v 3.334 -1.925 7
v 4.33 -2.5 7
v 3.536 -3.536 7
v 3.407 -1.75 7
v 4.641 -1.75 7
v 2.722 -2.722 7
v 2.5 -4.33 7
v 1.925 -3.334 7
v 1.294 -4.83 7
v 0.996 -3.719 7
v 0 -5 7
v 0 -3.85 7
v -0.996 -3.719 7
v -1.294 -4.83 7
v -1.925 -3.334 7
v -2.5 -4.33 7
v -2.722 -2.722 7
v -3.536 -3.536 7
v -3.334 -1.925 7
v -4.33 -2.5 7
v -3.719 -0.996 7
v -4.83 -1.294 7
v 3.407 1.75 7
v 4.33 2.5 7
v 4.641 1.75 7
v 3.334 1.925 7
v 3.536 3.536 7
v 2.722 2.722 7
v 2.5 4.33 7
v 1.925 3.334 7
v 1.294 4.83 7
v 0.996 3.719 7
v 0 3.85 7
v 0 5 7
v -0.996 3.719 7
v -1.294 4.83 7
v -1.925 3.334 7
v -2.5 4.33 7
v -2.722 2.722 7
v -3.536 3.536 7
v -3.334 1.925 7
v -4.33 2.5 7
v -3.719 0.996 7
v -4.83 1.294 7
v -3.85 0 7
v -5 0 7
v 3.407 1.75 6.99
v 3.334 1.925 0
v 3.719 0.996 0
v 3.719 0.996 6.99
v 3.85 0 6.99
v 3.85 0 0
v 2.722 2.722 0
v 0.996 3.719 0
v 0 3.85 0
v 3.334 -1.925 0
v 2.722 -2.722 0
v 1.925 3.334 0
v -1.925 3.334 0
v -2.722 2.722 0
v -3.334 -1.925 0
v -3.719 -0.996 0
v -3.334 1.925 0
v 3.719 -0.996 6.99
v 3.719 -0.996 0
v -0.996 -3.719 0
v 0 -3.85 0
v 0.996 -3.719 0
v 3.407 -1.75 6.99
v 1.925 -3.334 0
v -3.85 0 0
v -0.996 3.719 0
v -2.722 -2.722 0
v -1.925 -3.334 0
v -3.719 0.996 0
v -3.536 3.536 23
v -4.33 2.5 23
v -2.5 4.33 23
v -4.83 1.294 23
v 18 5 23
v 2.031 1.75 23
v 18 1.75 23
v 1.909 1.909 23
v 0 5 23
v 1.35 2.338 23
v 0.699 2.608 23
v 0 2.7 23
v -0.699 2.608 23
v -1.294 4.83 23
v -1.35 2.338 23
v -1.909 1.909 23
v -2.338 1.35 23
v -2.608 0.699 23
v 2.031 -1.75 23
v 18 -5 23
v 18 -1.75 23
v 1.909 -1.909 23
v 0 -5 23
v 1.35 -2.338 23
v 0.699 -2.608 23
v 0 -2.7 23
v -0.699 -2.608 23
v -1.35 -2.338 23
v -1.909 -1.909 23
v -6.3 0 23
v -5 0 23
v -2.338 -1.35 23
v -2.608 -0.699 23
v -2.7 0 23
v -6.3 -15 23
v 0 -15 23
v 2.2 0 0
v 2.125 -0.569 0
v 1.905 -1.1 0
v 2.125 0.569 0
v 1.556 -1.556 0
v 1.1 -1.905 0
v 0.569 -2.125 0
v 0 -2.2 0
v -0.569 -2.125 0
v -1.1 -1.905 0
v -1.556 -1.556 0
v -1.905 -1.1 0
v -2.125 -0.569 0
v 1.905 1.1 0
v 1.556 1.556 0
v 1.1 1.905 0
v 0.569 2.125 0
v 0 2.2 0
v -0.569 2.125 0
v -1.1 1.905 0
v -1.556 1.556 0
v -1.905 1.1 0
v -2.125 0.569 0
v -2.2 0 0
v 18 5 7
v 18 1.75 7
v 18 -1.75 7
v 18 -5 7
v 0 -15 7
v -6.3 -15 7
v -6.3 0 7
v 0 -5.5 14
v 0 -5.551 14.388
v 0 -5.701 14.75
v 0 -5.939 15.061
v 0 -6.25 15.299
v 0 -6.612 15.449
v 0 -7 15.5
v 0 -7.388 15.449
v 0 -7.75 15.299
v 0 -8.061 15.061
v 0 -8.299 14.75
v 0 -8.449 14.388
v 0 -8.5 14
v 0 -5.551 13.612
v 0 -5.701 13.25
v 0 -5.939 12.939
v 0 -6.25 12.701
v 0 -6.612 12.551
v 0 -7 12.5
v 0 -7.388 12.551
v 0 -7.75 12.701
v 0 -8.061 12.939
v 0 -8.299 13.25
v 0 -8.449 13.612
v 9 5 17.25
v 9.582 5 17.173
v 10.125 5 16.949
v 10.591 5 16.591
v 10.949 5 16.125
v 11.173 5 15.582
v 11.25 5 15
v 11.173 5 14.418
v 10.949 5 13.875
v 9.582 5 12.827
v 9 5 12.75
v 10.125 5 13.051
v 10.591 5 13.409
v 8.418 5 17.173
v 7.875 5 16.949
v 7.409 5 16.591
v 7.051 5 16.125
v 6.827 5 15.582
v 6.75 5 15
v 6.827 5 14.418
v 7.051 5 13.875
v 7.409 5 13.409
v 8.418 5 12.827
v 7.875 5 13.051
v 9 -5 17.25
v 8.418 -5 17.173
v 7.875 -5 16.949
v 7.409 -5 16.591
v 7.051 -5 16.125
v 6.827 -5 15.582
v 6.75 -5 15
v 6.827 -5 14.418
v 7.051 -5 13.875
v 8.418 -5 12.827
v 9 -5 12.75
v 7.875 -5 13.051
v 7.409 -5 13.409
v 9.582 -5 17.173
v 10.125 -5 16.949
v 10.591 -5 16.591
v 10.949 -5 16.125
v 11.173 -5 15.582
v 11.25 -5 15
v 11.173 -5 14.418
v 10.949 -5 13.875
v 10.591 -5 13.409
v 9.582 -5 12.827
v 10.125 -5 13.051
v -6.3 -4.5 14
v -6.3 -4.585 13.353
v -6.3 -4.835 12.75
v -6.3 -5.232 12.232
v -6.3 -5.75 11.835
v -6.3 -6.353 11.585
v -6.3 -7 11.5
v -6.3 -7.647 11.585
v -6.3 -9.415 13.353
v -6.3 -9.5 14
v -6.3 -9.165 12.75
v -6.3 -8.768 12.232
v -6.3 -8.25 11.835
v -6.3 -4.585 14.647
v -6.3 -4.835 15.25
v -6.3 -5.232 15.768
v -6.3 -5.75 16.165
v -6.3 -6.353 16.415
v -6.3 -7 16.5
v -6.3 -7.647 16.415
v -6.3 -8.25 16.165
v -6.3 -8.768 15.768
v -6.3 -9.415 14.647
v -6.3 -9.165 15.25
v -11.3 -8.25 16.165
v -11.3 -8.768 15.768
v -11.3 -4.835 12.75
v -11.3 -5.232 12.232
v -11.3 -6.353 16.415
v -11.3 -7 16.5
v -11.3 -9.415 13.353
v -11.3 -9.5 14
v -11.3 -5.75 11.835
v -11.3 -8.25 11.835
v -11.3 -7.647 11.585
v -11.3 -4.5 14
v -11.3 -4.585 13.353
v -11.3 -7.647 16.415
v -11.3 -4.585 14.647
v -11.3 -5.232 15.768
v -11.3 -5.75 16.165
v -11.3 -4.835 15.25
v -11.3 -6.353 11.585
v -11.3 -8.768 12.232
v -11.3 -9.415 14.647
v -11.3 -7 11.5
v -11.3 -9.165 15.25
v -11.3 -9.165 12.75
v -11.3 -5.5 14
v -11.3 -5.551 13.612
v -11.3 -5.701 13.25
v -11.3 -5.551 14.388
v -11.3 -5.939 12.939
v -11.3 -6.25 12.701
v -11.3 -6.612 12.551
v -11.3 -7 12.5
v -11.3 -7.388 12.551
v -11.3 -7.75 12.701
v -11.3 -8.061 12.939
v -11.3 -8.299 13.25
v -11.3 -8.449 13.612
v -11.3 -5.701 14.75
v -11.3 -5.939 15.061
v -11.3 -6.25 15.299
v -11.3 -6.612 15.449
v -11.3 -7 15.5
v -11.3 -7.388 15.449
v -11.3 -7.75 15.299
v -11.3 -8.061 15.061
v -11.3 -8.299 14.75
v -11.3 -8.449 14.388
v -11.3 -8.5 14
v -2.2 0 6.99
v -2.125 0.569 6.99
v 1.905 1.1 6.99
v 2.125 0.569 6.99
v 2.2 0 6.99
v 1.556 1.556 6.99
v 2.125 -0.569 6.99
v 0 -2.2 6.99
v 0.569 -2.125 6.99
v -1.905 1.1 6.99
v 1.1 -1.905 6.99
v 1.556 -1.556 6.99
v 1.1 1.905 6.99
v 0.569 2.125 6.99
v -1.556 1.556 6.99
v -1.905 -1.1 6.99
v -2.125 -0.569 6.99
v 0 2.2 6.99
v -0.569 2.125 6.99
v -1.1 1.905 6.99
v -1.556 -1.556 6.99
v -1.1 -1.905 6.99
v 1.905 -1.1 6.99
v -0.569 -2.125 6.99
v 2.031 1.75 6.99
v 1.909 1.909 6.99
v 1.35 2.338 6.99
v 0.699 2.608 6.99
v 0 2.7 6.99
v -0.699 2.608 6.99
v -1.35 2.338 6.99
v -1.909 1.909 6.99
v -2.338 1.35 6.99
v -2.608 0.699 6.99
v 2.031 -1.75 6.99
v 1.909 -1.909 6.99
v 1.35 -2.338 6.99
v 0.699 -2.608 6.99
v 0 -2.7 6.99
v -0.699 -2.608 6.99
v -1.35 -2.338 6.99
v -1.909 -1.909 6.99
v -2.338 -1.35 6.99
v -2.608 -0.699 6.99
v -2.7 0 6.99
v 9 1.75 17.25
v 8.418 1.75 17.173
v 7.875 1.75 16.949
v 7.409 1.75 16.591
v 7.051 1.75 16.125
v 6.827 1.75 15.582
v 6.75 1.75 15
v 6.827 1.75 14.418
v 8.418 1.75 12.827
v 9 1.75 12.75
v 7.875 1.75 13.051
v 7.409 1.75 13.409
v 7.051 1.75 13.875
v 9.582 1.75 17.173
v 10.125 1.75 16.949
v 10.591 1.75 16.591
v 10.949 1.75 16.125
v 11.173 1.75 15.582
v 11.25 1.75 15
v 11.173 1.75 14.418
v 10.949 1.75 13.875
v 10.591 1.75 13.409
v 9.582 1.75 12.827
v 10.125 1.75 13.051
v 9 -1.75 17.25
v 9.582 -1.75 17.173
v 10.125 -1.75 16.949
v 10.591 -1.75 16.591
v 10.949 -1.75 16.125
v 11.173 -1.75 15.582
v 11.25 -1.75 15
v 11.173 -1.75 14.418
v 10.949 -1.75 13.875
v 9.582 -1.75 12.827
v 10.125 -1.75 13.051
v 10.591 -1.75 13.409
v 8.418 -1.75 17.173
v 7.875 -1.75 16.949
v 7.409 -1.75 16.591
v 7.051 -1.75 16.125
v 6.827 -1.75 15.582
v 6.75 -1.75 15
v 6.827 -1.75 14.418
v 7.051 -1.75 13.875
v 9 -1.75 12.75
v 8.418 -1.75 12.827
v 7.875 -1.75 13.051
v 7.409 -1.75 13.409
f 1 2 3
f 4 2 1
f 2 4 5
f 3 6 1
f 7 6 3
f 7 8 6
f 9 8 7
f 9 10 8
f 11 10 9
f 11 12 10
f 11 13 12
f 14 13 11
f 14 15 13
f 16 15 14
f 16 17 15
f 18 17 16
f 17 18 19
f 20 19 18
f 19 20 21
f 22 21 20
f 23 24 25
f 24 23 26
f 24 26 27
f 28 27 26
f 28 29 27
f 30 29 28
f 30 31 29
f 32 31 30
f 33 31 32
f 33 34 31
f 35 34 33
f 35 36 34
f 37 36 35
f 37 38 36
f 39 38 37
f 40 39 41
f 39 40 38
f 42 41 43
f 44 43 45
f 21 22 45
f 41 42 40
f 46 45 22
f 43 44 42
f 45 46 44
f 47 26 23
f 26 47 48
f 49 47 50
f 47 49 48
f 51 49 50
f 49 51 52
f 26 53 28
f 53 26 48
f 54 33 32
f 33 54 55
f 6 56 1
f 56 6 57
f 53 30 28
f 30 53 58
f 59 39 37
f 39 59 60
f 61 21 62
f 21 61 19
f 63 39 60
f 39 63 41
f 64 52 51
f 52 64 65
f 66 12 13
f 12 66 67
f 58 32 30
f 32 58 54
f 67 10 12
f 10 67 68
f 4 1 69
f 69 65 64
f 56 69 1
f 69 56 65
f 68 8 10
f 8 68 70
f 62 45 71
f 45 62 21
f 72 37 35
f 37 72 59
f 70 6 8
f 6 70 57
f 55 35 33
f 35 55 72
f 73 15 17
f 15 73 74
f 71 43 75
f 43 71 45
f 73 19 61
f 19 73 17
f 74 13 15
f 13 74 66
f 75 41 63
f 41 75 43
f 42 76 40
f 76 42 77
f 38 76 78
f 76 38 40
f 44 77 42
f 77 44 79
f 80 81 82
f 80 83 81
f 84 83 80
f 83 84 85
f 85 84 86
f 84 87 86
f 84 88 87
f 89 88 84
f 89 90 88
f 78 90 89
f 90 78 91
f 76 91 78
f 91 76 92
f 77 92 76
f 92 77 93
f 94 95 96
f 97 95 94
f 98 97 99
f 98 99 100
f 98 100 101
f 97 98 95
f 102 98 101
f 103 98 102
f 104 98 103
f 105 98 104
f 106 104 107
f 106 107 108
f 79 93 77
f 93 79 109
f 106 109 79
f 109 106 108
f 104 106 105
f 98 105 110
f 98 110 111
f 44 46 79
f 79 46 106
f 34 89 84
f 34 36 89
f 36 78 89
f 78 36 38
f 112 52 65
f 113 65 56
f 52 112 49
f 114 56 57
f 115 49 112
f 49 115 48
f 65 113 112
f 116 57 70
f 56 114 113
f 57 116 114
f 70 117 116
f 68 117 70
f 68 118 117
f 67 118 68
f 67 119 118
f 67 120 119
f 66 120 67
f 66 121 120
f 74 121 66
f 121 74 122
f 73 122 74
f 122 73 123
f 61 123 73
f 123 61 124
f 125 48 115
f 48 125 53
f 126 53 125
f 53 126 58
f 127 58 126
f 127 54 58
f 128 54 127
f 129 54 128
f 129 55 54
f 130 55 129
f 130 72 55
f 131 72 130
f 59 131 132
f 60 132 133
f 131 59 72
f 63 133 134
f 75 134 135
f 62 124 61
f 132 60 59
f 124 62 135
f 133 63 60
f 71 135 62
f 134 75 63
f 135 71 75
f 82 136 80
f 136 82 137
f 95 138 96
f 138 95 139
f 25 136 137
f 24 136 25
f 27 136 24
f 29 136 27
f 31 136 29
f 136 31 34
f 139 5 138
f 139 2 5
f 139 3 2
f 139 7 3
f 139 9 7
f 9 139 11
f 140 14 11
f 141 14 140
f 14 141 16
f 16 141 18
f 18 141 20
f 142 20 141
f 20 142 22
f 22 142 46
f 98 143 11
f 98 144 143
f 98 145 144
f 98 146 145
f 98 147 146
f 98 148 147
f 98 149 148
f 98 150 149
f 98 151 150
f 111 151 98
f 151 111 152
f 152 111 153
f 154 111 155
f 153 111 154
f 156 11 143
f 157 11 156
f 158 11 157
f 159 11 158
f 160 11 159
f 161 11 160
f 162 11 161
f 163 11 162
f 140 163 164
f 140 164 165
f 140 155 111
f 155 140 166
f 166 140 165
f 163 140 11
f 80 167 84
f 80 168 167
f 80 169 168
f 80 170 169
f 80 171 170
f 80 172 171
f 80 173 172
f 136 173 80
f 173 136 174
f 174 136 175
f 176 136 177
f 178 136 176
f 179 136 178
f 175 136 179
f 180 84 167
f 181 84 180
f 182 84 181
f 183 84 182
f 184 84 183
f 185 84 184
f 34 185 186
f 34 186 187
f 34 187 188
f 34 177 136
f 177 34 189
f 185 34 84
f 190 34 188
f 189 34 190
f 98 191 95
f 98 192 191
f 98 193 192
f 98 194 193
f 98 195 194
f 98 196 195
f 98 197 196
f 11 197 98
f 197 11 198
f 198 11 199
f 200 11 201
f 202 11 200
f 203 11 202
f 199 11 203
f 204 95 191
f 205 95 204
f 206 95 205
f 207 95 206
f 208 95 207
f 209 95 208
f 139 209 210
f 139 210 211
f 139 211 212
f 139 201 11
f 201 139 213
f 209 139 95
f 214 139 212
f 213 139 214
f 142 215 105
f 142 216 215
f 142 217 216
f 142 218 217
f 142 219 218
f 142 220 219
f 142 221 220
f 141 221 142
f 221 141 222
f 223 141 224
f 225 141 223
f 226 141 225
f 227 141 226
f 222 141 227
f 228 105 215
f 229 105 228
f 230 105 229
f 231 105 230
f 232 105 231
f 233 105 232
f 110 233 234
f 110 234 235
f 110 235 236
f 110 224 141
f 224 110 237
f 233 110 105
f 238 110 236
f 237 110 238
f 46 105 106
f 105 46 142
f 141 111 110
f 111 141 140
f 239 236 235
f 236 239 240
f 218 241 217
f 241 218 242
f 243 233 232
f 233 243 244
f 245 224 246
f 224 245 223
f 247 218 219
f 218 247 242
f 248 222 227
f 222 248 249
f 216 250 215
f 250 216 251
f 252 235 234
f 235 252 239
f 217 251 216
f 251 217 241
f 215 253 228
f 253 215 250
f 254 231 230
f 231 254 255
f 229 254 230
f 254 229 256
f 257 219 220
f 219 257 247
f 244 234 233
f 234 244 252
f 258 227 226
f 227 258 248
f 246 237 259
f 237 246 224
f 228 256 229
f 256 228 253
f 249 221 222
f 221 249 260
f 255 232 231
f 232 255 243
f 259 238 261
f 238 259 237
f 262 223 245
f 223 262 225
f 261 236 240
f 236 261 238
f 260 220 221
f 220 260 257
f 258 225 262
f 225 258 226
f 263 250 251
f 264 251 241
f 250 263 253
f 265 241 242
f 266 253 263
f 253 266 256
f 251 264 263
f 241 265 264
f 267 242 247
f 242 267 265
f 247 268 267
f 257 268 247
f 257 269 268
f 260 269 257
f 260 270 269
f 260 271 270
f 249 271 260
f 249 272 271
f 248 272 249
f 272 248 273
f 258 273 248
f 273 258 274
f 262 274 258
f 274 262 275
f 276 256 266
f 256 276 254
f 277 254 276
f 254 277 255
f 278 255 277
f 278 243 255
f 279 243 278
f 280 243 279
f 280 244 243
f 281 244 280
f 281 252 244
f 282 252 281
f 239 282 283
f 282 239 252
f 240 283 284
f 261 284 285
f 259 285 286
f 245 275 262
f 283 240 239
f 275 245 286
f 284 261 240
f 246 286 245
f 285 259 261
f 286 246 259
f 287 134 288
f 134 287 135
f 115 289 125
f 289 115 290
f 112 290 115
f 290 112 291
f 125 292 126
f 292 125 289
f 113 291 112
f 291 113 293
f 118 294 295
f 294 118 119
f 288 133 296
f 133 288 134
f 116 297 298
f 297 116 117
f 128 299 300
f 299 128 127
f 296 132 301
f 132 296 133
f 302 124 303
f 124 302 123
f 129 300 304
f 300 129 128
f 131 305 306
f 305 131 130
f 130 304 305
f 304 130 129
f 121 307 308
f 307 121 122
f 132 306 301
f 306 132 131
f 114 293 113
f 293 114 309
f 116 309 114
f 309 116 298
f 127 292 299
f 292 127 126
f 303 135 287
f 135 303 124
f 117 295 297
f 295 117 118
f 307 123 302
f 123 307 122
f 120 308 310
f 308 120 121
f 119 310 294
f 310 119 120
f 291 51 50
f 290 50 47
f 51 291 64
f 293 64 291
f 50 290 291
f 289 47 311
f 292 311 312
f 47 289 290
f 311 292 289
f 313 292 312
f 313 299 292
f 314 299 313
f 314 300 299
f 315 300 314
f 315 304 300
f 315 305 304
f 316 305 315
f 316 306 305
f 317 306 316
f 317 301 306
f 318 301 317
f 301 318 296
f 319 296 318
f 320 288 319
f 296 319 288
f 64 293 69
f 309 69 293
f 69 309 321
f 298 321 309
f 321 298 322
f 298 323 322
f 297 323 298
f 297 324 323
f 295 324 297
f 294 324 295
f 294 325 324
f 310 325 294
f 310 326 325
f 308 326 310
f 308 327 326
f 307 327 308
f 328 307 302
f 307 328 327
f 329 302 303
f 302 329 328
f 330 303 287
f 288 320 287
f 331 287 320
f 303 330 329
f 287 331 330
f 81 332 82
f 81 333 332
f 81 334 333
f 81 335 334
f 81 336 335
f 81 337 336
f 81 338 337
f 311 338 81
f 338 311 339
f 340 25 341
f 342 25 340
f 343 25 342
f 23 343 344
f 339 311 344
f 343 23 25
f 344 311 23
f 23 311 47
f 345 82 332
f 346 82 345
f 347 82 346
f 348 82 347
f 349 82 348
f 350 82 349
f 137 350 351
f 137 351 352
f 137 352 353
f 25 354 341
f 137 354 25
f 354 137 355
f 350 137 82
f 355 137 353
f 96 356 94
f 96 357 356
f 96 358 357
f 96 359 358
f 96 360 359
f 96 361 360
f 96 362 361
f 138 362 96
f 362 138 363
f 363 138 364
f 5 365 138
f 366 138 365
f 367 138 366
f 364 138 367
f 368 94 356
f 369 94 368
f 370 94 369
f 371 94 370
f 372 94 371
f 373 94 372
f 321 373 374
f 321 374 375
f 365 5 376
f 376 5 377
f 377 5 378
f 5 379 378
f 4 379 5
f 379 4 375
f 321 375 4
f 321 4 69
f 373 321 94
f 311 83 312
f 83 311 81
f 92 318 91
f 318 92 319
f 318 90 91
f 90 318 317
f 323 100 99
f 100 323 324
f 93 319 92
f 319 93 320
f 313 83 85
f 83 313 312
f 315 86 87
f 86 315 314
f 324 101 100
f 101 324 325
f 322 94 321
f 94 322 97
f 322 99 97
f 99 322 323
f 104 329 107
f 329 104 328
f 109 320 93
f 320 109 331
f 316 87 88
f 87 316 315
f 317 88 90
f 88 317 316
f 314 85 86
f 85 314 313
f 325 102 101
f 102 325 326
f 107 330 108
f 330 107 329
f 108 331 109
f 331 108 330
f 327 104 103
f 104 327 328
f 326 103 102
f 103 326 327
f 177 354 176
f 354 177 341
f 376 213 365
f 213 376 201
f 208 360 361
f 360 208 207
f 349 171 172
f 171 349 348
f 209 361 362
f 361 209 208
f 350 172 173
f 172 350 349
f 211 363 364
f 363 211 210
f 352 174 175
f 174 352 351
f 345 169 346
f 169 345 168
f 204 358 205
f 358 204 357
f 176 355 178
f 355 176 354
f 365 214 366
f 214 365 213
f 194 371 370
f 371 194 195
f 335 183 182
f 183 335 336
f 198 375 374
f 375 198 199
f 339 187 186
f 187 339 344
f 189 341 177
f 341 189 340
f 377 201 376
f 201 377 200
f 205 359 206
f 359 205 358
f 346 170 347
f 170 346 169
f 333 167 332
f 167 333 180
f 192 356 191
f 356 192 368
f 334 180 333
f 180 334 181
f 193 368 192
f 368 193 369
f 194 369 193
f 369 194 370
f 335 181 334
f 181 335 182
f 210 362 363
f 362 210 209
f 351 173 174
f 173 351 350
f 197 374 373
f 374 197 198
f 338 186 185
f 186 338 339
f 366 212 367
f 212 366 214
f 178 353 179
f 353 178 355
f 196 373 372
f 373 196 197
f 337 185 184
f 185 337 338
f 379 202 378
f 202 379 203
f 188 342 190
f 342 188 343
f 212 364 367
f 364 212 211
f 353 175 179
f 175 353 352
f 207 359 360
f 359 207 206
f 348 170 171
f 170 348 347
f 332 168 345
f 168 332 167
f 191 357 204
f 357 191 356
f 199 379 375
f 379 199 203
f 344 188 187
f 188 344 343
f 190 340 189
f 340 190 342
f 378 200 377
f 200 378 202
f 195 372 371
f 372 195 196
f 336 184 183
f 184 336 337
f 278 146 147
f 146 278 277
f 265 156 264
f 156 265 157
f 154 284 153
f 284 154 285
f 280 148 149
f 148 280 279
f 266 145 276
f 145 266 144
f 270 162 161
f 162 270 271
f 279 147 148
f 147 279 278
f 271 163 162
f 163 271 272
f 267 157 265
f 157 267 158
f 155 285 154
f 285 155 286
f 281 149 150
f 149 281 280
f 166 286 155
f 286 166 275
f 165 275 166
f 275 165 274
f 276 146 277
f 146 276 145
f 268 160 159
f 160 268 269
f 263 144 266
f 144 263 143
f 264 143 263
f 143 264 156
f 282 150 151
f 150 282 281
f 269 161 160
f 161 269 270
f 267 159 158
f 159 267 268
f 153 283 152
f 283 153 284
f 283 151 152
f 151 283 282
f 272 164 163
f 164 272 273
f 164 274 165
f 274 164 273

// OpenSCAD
module ptfe_tube_clip
(
	side_clip_sz=[15,6.3],
	size_clip_hole=[7,7,5,3,5],
	ext_diam=10,
	cut_diam=7.7,
	full_len=7+16,
	int_len=7,
	clip_len=18,
	clip_cut=3.5,
	ptfe_ext_diam=4.4,
	ptfe_clip_diam=5.4,
	screw_diam=4.5,
	screw_x=9,
	quality=1,
	attach=0.01,
)
{
	difference()
	{
		union()
		{
			difference()
			{
				cylinder(d=ext_diam,h=full_len,$fn=24*quality);
				
				translate([0,0,-attach])
					difference()
					{
						cylinder(d=ext_diam+attach,h=int_len+attach,$fn=24*quality);
						cylinder(d=cut_diam,h=int_len+attach,$fn=24*quality);
					}
			}
			//clip
			translate([0,-ext_diam/2,int_len])
				cube([clip_len,ext_diam,full_len-int_len]);
			//side clip
			translate([-side_clip_sz[1],-side_clip_sz[0],int_len])
				cube([side_clip_sz[1],side_clip_sz[0],full_len-int_len]);
			translate([-side_clip_sz[1]+attach,-size_clip_hole[0],size_clip_hole[1]+int_len])
				rotate(a=-90,v=[0,1,0])
					cylinder(d=size_clip_hole[2],h=size_clip_hole[4]+attach,center=false,$fn=24*quality);			
		}
		//ptfe
		translate([0,0,-attach])
			cylinder(d=ptfe_ext_diam,h=full_len+2*attach,$fn=24*quality);
		//clip cut
		translate([0,-clip_cut/2,int_len-attach])
				cube([clip_len+attach,clip_cut,full_len-int_len+2*attach]);
		//ptfe clip
		translate([0,0,int_len-attach])
			cylinder(d=ptfe_clip_diam,h=full_len-int_len+2*attach,$fn=24*quality);
			
		translate([screw_x,0,int_len+(full_len-int_len)/2])
			rotate(a=90,v=[1,0,0])
				cylinder(d=screw_diam,h=ext_diam+2*attach,center=true,$fn=24*quality);
		translate([attach,-size_clip_hole[0],size_clip_hole[1]+int_len])
			rotate(a=-90,v=[0,1,0])
				cylinder(d=size_clip_hole[3],h=size_clip_hole[4]+side_clip_sz[1]+2*attach,center=false,$fn=24*quality);
	}



}


ptfe_tube_clip();
